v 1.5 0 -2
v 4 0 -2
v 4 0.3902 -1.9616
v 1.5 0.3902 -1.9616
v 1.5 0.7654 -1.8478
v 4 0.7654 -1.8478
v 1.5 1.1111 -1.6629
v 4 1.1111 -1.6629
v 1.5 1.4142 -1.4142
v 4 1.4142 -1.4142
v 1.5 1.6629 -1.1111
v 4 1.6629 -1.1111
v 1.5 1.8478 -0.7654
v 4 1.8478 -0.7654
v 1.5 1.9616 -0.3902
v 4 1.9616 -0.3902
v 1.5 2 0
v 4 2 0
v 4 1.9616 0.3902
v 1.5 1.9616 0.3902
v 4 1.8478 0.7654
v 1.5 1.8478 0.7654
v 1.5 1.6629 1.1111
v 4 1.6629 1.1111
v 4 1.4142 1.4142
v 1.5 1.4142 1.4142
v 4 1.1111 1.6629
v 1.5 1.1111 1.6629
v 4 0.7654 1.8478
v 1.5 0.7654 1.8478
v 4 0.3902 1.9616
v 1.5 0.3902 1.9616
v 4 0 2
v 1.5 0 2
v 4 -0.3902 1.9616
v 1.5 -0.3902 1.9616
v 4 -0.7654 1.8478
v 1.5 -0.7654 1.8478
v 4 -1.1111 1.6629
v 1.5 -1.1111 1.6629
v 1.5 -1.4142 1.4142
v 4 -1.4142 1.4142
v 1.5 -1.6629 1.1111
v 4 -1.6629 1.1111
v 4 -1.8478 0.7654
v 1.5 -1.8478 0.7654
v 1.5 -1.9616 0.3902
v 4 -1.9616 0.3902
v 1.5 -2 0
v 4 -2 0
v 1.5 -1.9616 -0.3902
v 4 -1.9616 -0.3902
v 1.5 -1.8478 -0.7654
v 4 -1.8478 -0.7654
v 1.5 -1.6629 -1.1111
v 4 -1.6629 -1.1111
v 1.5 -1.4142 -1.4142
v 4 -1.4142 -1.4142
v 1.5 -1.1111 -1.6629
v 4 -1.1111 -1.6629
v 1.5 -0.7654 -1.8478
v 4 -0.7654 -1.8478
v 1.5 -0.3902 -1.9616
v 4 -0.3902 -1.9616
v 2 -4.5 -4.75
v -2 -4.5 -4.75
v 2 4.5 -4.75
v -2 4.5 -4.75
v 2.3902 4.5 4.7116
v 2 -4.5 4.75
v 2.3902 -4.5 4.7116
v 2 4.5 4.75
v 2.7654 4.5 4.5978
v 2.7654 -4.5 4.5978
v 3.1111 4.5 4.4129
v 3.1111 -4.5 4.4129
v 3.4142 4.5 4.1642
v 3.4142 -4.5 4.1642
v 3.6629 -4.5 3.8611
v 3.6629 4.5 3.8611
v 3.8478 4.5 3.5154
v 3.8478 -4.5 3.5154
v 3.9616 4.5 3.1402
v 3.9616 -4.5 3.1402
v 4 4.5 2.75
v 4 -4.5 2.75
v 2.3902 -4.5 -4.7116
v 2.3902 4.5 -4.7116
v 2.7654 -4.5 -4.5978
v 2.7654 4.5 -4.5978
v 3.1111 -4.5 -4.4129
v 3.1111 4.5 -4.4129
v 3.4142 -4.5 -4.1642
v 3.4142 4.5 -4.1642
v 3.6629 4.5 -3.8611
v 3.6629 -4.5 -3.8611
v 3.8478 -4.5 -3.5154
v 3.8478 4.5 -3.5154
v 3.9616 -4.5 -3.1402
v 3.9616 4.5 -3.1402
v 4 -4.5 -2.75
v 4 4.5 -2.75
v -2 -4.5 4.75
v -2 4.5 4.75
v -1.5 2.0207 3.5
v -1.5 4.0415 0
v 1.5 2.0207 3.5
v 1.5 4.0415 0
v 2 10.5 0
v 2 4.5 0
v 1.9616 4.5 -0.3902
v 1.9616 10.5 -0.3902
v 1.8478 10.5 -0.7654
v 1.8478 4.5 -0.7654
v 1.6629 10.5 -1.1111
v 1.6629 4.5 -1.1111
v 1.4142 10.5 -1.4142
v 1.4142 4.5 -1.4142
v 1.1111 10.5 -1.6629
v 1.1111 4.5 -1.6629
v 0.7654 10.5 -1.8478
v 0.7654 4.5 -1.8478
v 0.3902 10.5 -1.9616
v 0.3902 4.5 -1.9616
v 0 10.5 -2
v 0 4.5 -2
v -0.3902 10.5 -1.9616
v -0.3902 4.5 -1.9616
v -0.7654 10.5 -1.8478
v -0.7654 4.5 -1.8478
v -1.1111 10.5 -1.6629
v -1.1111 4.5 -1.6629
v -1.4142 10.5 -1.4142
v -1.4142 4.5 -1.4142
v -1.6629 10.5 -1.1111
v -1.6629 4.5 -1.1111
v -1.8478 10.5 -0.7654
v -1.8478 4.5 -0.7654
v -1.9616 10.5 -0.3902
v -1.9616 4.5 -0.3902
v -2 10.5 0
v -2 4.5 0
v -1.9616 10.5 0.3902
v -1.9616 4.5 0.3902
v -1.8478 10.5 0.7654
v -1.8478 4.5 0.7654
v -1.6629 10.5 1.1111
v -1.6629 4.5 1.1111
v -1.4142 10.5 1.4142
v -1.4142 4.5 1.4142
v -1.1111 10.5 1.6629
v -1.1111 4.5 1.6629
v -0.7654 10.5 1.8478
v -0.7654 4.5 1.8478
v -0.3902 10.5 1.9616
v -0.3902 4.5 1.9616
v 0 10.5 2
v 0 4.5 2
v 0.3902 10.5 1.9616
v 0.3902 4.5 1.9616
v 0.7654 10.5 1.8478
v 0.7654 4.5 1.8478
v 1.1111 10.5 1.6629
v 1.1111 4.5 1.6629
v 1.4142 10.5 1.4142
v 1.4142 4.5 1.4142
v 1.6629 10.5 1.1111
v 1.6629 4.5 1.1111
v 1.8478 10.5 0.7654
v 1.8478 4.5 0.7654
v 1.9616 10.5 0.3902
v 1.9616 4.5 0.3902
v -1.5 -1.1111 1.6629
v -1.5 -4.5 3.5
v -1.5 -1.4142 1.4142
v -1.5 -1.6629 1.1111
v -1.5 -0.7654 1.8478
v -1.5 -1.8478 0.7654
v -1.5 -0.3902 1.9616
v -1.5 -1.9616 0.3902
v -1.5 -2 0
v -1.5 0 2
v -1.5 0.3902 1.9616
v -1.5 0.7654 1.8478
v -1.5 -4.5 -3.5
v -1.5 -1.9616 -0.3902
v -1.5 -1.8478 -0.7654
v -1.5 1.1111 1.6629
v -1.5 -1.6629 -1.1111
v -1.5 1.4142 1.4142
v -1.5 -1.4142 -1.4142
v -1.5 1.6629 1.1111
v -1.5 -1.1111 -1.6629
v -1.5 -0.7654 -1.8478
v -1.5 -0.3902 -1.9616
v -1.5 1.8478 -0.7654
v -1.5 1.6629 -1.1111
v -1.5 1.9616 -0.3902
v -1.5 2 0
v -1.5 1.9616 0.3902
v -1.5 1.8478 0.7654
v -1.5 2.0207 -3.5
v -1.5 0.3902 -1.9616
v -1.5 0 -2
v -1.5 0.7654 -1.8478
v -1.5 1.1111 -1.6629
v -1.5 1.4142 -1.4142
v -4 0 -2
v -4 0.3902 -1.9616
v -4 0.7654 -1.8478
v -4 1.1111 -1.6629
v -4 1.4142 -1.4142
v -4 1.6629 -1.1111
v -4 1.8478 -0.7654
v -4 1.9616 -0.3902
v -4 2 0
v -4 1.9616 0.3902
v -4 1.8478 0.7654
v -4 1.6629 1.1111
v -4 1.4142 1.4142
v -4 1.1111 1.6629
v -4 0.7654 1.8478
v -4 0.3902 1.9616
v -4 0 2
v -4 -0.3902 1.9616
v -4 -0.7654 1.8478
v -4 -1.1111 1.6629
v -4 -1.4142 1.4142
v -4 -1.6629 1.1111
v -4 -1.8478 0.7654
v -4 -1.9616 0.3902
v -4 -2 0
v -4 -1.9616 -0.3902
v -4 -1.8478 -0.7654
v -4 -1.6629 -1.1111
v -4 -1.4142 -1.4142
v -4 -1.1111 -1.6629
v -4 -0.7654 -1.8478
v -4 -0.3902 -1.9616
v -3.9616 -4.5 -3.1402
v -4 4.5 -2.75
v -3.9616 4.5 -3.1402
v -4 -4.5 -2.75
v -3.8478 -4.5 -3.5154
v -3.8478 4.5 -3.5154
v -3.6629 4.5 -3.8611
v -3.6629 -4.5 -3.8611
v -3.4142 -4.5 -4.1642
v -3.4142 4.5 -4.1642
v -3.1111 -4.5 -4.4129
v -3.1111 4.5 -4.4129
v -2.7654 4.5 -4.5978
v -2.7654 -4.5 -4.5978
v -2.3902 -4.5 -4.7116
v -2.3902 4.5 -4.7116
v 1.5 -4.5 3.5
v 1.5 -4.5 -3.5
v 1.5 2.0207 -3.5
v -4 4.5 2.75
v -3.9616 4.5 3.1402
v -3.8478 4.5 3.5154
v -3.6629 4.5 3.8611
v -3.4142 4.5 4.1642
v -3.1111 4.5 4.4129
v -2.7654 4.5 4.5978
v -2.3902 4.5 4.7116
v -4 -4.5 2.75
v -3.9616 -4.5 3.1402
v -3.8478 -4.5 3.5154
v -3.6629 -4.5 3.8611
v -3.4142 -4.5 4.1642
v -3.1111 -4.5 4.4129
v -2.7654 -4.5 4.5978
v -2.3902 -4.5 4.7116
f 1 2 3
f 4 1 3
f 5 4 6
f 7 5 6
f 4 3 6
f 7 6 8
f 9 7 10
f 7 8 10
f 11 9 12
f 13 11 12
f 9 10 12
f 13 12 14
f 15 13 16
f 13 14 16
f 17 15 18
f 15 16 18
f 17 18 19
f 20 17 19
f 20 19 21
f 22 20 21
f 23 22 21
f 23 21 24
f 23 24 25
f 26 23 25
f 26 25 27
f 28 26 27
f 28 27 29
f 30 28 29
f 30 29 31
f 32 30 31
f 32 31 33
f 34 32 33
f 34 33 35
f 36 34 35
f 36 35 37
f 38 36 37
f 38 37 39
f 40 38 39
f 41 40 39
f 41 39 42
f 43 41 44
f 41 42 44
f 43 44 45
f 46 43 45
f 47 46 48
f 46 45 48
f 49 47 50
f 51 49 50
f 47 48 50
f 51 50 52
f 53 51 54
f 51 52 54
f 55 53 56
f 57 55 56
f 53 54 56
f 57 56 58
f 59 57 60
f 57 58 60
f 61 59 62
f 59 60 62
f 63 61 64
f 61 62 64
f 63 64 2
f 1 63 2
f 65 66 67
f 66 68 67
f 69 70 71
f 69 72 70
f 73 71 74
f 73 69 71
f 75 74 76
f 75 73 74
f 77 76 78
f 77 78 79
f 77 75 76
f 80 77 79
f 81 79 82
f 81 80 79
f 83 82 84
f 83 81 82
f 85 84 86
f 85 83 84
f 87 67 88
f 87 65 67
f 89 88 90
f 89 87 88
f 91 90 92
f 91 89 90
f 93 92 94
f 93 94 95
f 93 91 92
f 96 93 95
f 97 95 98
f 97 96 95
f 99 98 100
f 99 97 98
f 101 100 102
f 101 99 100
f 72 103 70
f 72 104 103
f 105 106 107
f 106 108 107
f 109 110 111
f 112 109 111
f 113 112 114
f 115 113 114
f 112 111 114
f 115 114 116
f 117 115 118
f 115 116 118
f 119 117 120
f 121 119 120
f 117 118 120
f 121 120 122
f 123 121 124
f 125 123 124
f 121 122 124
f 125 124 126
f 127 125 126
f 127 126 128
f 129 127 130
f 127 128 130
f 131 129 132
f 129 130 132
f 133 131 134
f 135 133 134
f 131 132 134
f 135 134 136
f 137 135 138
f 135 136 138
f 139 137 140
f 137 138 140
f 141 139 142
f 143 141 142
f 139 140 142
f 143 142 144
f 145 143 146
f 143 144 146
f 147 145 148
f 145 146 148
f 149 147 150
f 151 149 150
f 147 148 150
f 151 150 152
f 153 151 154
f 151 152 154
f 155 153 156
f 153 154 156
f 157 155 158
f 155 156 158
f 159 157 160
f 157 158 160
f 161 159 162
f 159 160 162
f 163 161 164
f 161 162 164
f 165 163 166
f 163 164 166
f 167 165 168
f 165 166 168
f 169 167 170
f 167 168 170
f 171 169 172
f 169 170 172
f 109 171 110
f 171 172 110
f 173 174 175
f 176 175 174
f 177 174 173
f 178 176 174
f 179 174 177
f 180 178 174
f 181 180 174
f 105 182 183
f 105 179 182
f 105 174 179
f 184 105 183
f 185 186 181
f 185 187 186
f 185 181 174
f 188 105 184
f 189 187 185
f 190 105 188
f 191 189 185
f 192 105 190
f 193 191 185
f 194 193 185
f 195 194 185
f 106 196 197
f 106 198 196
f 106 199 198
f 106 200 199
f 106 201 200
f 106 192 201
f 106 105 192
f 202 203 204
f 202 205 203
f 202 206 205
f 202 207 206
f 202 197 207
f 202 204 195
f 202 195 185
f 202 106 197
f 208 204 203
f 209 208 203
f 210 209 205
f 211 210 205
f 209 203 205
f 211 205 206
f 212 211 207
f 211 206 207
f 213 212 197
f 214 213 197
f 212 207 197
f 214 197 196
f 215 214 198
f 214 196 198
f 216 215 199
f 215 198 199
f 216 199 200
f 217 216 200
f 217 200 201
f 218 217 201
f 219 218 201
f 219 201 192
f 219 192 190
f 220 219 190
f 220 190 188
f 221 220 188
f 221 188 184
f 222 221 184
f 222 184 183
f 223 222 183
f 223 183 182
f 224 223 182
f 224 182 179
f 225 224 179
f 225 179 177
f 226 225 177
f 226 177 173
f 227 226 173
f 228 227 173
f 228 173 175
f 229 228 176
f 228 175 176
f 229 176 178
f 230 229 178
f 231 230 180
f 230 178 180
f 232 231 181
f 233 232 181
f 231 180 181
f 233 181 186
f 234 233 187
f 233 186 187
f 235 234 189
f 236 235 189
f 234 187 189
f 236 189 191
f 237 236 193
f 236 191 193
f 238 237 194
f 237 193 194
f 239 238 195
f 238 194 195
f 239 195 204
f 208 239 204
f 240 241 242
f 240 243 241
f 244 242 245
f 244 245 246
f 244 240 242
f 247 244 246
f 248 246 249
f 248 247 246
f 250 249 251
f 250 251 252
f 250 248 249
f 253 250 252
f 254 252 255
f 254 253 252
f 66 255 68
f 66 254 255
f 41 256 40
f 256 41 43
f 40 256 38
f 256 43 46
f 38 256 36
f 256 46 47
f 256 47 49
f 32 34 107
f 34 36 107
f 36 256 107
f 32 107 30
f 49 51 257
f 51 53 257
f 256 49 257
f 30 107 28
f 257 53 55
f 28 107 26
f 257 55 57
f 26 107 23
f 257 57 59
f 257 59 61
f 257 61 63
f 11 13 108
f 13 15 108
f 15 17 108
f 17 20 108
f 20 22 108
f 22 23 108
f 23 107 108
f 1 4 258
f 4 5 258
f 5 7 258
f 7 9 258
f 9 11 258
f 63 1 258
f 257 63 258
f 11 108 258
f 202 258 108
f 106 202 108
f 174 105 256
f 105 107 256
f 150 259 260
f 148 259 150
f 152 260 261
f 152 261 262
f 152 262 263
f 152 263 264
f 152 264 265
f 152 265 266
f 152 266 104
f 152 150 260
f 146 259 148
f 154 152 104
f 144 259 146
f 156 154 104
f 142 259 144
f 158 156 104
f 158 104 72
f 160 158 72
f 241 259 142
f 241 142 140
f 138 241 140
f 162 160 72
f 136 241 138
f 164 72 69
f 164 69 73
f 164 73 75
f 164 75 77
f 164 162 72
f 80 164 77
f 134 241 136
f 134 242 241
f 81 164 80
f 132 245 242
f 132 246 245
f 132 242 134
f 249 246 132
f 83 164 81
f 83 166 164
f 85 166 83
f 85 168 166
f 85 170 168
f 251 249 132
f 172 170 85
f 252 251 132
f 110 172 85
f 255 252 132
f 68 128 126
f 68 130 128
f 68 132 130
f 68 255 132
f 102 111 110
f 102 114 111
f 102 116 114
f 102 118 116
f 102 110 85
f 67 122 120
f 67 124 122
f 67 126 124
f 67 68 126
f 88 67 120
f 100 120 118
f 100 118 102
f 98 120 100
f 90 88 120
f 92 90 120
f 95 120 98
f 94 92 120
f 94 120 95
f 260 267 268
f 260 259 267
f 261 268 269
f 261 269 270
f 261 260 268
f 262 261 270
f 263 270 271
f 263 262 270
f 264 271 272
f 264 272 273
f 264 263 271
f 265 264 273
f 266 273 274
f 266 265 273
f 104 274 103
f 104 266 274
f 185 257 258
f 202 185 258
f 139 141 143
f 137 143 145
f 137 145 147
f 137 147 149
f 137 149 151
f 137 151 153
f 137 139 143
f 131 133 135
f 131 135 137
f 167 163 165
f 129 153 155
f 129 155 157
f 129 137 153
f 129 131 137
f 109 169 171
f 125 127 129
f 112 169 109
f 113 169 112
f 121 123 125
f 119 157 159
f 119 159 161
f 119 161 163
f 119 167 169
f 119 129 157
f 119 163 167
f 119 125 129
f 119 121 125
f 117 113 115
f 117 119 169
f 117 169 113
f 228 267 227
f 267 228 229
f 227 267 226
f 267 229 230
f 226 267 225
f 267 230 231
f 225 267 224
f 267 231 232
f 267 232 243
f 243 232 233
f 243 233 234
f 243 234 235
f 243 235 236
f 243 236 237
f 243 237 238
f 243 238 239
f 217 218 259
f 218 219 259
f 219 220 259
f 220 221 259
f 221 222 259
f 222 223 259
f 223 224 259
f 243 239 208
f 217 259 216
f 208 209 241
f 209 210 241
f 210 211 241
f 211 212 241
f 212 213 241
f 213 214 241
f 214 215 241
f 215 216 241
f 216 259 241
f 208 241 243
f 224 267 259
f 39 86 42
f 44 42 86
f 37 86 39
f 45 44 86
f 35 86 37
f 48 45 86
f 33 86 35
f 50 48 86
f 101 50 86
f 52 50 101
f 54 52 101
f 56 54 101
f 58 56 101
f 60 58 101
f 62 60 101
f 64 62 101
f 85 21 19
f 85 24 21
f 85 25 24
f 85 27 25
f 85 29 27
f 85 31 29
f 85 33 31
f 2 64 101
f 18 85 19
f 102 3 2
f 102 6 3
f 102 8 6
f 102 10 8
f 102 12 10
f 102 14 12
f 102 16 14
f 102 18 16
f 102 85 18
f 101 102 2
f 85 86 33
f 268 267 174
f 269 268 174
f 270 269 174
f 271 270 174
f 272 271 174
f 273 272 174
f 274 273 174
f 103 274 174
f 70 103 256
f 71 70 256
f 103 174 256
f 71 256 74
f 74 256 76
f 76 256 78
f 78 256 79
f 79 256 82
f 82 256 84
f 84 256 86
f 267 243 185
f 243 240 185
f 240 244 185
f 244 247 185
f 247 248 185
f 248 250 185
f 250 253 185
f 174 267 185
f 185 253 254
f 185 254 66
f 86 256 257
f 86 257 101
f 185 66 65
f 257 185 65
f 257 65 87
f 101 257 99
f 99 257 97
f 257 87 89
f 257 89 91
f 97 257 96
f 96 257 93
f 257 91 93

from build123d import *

# Parameters (mm, degrees)
SKETCH1_W           = 8
SKETCH1_H           = 9.5
BOSS_EXTRUDE1_DEPTH = 4.5
SKETCH2_R           = 2
BOSS_EXTRUDE2_DEPTH = 6
CUT_EXTRUDE1_DEPTH  = 1.5
SKETCH6_R           = 2
CUT_EXTRUDE2_DEPTH  = 9
FILLET1_R           = 2


with BuildPart() as part:
    # Sketch1 → Boss-Extrude1 (new body, symmetric)
    with BuildSketch(Plane(origin=(0, 0, 0), x_dir=(1, 0, 0), z_dir=(0, 1, 0))):
        Rectangle(SKETCH1_W, SKETCH1_H)
    extrude(amount=BOSS_EXTRUDE1_DEPTH, both=True)

    # Sketch2 → Boss-Extrude2 (add)
    with BuildSketch(Plane(origin=(0, 4.5, 0), x_dir=(1, 0, 0), z_dir=(0, 1, 0))):
        Circle(SKETCH2_R)
    extrude(amount=BOSS_EXTRUDE2_DEPTH)

    # Sketch5 → Cut-Extrude1 (cut, symmetric)
    with BuildSketch(Plane(origin=(0, 0, 0), x_dir=(0, 0, -1), z_dir=(1, 0, 0))):
        Polygon((-3.5, -2.020725942), (-3.5, -4.5), (3.5, -4.5), (3.5, -2.020725942), (3.5, 2.020725942), (0, 4.041451884), (-3.5, 2.020725942), align=None)
    extrude(amount=CUT_EXTRUDE1_DEPTH, both=True, mode=Mode.SUBTRACT)

    # Sketch6 → Cut-Extrude2 (cut, through all)
    with BuildSketch(Plane(origin=(4, 0, 0), x_dir=(0, 0, -1), z_dir=(1, 0, 0))):
        Circle(SKETCH6_R)
    extrude(amount=-CUT_EXTRUDE2_DEPTH, mode=Mode.SUBTRACT)

    # Fillet1
    fillet1_edges = [part.edges().sort_by_distance(p)[0] for p in [
        (-4, 0, -4.75),
        (4, 0, -4.75),
        (4, 0, 4.75),
        (-4, 0, 4.75),
    ]]
    fillet(fillet1_edges, radius=FILLET1_R)


solid = part.part
